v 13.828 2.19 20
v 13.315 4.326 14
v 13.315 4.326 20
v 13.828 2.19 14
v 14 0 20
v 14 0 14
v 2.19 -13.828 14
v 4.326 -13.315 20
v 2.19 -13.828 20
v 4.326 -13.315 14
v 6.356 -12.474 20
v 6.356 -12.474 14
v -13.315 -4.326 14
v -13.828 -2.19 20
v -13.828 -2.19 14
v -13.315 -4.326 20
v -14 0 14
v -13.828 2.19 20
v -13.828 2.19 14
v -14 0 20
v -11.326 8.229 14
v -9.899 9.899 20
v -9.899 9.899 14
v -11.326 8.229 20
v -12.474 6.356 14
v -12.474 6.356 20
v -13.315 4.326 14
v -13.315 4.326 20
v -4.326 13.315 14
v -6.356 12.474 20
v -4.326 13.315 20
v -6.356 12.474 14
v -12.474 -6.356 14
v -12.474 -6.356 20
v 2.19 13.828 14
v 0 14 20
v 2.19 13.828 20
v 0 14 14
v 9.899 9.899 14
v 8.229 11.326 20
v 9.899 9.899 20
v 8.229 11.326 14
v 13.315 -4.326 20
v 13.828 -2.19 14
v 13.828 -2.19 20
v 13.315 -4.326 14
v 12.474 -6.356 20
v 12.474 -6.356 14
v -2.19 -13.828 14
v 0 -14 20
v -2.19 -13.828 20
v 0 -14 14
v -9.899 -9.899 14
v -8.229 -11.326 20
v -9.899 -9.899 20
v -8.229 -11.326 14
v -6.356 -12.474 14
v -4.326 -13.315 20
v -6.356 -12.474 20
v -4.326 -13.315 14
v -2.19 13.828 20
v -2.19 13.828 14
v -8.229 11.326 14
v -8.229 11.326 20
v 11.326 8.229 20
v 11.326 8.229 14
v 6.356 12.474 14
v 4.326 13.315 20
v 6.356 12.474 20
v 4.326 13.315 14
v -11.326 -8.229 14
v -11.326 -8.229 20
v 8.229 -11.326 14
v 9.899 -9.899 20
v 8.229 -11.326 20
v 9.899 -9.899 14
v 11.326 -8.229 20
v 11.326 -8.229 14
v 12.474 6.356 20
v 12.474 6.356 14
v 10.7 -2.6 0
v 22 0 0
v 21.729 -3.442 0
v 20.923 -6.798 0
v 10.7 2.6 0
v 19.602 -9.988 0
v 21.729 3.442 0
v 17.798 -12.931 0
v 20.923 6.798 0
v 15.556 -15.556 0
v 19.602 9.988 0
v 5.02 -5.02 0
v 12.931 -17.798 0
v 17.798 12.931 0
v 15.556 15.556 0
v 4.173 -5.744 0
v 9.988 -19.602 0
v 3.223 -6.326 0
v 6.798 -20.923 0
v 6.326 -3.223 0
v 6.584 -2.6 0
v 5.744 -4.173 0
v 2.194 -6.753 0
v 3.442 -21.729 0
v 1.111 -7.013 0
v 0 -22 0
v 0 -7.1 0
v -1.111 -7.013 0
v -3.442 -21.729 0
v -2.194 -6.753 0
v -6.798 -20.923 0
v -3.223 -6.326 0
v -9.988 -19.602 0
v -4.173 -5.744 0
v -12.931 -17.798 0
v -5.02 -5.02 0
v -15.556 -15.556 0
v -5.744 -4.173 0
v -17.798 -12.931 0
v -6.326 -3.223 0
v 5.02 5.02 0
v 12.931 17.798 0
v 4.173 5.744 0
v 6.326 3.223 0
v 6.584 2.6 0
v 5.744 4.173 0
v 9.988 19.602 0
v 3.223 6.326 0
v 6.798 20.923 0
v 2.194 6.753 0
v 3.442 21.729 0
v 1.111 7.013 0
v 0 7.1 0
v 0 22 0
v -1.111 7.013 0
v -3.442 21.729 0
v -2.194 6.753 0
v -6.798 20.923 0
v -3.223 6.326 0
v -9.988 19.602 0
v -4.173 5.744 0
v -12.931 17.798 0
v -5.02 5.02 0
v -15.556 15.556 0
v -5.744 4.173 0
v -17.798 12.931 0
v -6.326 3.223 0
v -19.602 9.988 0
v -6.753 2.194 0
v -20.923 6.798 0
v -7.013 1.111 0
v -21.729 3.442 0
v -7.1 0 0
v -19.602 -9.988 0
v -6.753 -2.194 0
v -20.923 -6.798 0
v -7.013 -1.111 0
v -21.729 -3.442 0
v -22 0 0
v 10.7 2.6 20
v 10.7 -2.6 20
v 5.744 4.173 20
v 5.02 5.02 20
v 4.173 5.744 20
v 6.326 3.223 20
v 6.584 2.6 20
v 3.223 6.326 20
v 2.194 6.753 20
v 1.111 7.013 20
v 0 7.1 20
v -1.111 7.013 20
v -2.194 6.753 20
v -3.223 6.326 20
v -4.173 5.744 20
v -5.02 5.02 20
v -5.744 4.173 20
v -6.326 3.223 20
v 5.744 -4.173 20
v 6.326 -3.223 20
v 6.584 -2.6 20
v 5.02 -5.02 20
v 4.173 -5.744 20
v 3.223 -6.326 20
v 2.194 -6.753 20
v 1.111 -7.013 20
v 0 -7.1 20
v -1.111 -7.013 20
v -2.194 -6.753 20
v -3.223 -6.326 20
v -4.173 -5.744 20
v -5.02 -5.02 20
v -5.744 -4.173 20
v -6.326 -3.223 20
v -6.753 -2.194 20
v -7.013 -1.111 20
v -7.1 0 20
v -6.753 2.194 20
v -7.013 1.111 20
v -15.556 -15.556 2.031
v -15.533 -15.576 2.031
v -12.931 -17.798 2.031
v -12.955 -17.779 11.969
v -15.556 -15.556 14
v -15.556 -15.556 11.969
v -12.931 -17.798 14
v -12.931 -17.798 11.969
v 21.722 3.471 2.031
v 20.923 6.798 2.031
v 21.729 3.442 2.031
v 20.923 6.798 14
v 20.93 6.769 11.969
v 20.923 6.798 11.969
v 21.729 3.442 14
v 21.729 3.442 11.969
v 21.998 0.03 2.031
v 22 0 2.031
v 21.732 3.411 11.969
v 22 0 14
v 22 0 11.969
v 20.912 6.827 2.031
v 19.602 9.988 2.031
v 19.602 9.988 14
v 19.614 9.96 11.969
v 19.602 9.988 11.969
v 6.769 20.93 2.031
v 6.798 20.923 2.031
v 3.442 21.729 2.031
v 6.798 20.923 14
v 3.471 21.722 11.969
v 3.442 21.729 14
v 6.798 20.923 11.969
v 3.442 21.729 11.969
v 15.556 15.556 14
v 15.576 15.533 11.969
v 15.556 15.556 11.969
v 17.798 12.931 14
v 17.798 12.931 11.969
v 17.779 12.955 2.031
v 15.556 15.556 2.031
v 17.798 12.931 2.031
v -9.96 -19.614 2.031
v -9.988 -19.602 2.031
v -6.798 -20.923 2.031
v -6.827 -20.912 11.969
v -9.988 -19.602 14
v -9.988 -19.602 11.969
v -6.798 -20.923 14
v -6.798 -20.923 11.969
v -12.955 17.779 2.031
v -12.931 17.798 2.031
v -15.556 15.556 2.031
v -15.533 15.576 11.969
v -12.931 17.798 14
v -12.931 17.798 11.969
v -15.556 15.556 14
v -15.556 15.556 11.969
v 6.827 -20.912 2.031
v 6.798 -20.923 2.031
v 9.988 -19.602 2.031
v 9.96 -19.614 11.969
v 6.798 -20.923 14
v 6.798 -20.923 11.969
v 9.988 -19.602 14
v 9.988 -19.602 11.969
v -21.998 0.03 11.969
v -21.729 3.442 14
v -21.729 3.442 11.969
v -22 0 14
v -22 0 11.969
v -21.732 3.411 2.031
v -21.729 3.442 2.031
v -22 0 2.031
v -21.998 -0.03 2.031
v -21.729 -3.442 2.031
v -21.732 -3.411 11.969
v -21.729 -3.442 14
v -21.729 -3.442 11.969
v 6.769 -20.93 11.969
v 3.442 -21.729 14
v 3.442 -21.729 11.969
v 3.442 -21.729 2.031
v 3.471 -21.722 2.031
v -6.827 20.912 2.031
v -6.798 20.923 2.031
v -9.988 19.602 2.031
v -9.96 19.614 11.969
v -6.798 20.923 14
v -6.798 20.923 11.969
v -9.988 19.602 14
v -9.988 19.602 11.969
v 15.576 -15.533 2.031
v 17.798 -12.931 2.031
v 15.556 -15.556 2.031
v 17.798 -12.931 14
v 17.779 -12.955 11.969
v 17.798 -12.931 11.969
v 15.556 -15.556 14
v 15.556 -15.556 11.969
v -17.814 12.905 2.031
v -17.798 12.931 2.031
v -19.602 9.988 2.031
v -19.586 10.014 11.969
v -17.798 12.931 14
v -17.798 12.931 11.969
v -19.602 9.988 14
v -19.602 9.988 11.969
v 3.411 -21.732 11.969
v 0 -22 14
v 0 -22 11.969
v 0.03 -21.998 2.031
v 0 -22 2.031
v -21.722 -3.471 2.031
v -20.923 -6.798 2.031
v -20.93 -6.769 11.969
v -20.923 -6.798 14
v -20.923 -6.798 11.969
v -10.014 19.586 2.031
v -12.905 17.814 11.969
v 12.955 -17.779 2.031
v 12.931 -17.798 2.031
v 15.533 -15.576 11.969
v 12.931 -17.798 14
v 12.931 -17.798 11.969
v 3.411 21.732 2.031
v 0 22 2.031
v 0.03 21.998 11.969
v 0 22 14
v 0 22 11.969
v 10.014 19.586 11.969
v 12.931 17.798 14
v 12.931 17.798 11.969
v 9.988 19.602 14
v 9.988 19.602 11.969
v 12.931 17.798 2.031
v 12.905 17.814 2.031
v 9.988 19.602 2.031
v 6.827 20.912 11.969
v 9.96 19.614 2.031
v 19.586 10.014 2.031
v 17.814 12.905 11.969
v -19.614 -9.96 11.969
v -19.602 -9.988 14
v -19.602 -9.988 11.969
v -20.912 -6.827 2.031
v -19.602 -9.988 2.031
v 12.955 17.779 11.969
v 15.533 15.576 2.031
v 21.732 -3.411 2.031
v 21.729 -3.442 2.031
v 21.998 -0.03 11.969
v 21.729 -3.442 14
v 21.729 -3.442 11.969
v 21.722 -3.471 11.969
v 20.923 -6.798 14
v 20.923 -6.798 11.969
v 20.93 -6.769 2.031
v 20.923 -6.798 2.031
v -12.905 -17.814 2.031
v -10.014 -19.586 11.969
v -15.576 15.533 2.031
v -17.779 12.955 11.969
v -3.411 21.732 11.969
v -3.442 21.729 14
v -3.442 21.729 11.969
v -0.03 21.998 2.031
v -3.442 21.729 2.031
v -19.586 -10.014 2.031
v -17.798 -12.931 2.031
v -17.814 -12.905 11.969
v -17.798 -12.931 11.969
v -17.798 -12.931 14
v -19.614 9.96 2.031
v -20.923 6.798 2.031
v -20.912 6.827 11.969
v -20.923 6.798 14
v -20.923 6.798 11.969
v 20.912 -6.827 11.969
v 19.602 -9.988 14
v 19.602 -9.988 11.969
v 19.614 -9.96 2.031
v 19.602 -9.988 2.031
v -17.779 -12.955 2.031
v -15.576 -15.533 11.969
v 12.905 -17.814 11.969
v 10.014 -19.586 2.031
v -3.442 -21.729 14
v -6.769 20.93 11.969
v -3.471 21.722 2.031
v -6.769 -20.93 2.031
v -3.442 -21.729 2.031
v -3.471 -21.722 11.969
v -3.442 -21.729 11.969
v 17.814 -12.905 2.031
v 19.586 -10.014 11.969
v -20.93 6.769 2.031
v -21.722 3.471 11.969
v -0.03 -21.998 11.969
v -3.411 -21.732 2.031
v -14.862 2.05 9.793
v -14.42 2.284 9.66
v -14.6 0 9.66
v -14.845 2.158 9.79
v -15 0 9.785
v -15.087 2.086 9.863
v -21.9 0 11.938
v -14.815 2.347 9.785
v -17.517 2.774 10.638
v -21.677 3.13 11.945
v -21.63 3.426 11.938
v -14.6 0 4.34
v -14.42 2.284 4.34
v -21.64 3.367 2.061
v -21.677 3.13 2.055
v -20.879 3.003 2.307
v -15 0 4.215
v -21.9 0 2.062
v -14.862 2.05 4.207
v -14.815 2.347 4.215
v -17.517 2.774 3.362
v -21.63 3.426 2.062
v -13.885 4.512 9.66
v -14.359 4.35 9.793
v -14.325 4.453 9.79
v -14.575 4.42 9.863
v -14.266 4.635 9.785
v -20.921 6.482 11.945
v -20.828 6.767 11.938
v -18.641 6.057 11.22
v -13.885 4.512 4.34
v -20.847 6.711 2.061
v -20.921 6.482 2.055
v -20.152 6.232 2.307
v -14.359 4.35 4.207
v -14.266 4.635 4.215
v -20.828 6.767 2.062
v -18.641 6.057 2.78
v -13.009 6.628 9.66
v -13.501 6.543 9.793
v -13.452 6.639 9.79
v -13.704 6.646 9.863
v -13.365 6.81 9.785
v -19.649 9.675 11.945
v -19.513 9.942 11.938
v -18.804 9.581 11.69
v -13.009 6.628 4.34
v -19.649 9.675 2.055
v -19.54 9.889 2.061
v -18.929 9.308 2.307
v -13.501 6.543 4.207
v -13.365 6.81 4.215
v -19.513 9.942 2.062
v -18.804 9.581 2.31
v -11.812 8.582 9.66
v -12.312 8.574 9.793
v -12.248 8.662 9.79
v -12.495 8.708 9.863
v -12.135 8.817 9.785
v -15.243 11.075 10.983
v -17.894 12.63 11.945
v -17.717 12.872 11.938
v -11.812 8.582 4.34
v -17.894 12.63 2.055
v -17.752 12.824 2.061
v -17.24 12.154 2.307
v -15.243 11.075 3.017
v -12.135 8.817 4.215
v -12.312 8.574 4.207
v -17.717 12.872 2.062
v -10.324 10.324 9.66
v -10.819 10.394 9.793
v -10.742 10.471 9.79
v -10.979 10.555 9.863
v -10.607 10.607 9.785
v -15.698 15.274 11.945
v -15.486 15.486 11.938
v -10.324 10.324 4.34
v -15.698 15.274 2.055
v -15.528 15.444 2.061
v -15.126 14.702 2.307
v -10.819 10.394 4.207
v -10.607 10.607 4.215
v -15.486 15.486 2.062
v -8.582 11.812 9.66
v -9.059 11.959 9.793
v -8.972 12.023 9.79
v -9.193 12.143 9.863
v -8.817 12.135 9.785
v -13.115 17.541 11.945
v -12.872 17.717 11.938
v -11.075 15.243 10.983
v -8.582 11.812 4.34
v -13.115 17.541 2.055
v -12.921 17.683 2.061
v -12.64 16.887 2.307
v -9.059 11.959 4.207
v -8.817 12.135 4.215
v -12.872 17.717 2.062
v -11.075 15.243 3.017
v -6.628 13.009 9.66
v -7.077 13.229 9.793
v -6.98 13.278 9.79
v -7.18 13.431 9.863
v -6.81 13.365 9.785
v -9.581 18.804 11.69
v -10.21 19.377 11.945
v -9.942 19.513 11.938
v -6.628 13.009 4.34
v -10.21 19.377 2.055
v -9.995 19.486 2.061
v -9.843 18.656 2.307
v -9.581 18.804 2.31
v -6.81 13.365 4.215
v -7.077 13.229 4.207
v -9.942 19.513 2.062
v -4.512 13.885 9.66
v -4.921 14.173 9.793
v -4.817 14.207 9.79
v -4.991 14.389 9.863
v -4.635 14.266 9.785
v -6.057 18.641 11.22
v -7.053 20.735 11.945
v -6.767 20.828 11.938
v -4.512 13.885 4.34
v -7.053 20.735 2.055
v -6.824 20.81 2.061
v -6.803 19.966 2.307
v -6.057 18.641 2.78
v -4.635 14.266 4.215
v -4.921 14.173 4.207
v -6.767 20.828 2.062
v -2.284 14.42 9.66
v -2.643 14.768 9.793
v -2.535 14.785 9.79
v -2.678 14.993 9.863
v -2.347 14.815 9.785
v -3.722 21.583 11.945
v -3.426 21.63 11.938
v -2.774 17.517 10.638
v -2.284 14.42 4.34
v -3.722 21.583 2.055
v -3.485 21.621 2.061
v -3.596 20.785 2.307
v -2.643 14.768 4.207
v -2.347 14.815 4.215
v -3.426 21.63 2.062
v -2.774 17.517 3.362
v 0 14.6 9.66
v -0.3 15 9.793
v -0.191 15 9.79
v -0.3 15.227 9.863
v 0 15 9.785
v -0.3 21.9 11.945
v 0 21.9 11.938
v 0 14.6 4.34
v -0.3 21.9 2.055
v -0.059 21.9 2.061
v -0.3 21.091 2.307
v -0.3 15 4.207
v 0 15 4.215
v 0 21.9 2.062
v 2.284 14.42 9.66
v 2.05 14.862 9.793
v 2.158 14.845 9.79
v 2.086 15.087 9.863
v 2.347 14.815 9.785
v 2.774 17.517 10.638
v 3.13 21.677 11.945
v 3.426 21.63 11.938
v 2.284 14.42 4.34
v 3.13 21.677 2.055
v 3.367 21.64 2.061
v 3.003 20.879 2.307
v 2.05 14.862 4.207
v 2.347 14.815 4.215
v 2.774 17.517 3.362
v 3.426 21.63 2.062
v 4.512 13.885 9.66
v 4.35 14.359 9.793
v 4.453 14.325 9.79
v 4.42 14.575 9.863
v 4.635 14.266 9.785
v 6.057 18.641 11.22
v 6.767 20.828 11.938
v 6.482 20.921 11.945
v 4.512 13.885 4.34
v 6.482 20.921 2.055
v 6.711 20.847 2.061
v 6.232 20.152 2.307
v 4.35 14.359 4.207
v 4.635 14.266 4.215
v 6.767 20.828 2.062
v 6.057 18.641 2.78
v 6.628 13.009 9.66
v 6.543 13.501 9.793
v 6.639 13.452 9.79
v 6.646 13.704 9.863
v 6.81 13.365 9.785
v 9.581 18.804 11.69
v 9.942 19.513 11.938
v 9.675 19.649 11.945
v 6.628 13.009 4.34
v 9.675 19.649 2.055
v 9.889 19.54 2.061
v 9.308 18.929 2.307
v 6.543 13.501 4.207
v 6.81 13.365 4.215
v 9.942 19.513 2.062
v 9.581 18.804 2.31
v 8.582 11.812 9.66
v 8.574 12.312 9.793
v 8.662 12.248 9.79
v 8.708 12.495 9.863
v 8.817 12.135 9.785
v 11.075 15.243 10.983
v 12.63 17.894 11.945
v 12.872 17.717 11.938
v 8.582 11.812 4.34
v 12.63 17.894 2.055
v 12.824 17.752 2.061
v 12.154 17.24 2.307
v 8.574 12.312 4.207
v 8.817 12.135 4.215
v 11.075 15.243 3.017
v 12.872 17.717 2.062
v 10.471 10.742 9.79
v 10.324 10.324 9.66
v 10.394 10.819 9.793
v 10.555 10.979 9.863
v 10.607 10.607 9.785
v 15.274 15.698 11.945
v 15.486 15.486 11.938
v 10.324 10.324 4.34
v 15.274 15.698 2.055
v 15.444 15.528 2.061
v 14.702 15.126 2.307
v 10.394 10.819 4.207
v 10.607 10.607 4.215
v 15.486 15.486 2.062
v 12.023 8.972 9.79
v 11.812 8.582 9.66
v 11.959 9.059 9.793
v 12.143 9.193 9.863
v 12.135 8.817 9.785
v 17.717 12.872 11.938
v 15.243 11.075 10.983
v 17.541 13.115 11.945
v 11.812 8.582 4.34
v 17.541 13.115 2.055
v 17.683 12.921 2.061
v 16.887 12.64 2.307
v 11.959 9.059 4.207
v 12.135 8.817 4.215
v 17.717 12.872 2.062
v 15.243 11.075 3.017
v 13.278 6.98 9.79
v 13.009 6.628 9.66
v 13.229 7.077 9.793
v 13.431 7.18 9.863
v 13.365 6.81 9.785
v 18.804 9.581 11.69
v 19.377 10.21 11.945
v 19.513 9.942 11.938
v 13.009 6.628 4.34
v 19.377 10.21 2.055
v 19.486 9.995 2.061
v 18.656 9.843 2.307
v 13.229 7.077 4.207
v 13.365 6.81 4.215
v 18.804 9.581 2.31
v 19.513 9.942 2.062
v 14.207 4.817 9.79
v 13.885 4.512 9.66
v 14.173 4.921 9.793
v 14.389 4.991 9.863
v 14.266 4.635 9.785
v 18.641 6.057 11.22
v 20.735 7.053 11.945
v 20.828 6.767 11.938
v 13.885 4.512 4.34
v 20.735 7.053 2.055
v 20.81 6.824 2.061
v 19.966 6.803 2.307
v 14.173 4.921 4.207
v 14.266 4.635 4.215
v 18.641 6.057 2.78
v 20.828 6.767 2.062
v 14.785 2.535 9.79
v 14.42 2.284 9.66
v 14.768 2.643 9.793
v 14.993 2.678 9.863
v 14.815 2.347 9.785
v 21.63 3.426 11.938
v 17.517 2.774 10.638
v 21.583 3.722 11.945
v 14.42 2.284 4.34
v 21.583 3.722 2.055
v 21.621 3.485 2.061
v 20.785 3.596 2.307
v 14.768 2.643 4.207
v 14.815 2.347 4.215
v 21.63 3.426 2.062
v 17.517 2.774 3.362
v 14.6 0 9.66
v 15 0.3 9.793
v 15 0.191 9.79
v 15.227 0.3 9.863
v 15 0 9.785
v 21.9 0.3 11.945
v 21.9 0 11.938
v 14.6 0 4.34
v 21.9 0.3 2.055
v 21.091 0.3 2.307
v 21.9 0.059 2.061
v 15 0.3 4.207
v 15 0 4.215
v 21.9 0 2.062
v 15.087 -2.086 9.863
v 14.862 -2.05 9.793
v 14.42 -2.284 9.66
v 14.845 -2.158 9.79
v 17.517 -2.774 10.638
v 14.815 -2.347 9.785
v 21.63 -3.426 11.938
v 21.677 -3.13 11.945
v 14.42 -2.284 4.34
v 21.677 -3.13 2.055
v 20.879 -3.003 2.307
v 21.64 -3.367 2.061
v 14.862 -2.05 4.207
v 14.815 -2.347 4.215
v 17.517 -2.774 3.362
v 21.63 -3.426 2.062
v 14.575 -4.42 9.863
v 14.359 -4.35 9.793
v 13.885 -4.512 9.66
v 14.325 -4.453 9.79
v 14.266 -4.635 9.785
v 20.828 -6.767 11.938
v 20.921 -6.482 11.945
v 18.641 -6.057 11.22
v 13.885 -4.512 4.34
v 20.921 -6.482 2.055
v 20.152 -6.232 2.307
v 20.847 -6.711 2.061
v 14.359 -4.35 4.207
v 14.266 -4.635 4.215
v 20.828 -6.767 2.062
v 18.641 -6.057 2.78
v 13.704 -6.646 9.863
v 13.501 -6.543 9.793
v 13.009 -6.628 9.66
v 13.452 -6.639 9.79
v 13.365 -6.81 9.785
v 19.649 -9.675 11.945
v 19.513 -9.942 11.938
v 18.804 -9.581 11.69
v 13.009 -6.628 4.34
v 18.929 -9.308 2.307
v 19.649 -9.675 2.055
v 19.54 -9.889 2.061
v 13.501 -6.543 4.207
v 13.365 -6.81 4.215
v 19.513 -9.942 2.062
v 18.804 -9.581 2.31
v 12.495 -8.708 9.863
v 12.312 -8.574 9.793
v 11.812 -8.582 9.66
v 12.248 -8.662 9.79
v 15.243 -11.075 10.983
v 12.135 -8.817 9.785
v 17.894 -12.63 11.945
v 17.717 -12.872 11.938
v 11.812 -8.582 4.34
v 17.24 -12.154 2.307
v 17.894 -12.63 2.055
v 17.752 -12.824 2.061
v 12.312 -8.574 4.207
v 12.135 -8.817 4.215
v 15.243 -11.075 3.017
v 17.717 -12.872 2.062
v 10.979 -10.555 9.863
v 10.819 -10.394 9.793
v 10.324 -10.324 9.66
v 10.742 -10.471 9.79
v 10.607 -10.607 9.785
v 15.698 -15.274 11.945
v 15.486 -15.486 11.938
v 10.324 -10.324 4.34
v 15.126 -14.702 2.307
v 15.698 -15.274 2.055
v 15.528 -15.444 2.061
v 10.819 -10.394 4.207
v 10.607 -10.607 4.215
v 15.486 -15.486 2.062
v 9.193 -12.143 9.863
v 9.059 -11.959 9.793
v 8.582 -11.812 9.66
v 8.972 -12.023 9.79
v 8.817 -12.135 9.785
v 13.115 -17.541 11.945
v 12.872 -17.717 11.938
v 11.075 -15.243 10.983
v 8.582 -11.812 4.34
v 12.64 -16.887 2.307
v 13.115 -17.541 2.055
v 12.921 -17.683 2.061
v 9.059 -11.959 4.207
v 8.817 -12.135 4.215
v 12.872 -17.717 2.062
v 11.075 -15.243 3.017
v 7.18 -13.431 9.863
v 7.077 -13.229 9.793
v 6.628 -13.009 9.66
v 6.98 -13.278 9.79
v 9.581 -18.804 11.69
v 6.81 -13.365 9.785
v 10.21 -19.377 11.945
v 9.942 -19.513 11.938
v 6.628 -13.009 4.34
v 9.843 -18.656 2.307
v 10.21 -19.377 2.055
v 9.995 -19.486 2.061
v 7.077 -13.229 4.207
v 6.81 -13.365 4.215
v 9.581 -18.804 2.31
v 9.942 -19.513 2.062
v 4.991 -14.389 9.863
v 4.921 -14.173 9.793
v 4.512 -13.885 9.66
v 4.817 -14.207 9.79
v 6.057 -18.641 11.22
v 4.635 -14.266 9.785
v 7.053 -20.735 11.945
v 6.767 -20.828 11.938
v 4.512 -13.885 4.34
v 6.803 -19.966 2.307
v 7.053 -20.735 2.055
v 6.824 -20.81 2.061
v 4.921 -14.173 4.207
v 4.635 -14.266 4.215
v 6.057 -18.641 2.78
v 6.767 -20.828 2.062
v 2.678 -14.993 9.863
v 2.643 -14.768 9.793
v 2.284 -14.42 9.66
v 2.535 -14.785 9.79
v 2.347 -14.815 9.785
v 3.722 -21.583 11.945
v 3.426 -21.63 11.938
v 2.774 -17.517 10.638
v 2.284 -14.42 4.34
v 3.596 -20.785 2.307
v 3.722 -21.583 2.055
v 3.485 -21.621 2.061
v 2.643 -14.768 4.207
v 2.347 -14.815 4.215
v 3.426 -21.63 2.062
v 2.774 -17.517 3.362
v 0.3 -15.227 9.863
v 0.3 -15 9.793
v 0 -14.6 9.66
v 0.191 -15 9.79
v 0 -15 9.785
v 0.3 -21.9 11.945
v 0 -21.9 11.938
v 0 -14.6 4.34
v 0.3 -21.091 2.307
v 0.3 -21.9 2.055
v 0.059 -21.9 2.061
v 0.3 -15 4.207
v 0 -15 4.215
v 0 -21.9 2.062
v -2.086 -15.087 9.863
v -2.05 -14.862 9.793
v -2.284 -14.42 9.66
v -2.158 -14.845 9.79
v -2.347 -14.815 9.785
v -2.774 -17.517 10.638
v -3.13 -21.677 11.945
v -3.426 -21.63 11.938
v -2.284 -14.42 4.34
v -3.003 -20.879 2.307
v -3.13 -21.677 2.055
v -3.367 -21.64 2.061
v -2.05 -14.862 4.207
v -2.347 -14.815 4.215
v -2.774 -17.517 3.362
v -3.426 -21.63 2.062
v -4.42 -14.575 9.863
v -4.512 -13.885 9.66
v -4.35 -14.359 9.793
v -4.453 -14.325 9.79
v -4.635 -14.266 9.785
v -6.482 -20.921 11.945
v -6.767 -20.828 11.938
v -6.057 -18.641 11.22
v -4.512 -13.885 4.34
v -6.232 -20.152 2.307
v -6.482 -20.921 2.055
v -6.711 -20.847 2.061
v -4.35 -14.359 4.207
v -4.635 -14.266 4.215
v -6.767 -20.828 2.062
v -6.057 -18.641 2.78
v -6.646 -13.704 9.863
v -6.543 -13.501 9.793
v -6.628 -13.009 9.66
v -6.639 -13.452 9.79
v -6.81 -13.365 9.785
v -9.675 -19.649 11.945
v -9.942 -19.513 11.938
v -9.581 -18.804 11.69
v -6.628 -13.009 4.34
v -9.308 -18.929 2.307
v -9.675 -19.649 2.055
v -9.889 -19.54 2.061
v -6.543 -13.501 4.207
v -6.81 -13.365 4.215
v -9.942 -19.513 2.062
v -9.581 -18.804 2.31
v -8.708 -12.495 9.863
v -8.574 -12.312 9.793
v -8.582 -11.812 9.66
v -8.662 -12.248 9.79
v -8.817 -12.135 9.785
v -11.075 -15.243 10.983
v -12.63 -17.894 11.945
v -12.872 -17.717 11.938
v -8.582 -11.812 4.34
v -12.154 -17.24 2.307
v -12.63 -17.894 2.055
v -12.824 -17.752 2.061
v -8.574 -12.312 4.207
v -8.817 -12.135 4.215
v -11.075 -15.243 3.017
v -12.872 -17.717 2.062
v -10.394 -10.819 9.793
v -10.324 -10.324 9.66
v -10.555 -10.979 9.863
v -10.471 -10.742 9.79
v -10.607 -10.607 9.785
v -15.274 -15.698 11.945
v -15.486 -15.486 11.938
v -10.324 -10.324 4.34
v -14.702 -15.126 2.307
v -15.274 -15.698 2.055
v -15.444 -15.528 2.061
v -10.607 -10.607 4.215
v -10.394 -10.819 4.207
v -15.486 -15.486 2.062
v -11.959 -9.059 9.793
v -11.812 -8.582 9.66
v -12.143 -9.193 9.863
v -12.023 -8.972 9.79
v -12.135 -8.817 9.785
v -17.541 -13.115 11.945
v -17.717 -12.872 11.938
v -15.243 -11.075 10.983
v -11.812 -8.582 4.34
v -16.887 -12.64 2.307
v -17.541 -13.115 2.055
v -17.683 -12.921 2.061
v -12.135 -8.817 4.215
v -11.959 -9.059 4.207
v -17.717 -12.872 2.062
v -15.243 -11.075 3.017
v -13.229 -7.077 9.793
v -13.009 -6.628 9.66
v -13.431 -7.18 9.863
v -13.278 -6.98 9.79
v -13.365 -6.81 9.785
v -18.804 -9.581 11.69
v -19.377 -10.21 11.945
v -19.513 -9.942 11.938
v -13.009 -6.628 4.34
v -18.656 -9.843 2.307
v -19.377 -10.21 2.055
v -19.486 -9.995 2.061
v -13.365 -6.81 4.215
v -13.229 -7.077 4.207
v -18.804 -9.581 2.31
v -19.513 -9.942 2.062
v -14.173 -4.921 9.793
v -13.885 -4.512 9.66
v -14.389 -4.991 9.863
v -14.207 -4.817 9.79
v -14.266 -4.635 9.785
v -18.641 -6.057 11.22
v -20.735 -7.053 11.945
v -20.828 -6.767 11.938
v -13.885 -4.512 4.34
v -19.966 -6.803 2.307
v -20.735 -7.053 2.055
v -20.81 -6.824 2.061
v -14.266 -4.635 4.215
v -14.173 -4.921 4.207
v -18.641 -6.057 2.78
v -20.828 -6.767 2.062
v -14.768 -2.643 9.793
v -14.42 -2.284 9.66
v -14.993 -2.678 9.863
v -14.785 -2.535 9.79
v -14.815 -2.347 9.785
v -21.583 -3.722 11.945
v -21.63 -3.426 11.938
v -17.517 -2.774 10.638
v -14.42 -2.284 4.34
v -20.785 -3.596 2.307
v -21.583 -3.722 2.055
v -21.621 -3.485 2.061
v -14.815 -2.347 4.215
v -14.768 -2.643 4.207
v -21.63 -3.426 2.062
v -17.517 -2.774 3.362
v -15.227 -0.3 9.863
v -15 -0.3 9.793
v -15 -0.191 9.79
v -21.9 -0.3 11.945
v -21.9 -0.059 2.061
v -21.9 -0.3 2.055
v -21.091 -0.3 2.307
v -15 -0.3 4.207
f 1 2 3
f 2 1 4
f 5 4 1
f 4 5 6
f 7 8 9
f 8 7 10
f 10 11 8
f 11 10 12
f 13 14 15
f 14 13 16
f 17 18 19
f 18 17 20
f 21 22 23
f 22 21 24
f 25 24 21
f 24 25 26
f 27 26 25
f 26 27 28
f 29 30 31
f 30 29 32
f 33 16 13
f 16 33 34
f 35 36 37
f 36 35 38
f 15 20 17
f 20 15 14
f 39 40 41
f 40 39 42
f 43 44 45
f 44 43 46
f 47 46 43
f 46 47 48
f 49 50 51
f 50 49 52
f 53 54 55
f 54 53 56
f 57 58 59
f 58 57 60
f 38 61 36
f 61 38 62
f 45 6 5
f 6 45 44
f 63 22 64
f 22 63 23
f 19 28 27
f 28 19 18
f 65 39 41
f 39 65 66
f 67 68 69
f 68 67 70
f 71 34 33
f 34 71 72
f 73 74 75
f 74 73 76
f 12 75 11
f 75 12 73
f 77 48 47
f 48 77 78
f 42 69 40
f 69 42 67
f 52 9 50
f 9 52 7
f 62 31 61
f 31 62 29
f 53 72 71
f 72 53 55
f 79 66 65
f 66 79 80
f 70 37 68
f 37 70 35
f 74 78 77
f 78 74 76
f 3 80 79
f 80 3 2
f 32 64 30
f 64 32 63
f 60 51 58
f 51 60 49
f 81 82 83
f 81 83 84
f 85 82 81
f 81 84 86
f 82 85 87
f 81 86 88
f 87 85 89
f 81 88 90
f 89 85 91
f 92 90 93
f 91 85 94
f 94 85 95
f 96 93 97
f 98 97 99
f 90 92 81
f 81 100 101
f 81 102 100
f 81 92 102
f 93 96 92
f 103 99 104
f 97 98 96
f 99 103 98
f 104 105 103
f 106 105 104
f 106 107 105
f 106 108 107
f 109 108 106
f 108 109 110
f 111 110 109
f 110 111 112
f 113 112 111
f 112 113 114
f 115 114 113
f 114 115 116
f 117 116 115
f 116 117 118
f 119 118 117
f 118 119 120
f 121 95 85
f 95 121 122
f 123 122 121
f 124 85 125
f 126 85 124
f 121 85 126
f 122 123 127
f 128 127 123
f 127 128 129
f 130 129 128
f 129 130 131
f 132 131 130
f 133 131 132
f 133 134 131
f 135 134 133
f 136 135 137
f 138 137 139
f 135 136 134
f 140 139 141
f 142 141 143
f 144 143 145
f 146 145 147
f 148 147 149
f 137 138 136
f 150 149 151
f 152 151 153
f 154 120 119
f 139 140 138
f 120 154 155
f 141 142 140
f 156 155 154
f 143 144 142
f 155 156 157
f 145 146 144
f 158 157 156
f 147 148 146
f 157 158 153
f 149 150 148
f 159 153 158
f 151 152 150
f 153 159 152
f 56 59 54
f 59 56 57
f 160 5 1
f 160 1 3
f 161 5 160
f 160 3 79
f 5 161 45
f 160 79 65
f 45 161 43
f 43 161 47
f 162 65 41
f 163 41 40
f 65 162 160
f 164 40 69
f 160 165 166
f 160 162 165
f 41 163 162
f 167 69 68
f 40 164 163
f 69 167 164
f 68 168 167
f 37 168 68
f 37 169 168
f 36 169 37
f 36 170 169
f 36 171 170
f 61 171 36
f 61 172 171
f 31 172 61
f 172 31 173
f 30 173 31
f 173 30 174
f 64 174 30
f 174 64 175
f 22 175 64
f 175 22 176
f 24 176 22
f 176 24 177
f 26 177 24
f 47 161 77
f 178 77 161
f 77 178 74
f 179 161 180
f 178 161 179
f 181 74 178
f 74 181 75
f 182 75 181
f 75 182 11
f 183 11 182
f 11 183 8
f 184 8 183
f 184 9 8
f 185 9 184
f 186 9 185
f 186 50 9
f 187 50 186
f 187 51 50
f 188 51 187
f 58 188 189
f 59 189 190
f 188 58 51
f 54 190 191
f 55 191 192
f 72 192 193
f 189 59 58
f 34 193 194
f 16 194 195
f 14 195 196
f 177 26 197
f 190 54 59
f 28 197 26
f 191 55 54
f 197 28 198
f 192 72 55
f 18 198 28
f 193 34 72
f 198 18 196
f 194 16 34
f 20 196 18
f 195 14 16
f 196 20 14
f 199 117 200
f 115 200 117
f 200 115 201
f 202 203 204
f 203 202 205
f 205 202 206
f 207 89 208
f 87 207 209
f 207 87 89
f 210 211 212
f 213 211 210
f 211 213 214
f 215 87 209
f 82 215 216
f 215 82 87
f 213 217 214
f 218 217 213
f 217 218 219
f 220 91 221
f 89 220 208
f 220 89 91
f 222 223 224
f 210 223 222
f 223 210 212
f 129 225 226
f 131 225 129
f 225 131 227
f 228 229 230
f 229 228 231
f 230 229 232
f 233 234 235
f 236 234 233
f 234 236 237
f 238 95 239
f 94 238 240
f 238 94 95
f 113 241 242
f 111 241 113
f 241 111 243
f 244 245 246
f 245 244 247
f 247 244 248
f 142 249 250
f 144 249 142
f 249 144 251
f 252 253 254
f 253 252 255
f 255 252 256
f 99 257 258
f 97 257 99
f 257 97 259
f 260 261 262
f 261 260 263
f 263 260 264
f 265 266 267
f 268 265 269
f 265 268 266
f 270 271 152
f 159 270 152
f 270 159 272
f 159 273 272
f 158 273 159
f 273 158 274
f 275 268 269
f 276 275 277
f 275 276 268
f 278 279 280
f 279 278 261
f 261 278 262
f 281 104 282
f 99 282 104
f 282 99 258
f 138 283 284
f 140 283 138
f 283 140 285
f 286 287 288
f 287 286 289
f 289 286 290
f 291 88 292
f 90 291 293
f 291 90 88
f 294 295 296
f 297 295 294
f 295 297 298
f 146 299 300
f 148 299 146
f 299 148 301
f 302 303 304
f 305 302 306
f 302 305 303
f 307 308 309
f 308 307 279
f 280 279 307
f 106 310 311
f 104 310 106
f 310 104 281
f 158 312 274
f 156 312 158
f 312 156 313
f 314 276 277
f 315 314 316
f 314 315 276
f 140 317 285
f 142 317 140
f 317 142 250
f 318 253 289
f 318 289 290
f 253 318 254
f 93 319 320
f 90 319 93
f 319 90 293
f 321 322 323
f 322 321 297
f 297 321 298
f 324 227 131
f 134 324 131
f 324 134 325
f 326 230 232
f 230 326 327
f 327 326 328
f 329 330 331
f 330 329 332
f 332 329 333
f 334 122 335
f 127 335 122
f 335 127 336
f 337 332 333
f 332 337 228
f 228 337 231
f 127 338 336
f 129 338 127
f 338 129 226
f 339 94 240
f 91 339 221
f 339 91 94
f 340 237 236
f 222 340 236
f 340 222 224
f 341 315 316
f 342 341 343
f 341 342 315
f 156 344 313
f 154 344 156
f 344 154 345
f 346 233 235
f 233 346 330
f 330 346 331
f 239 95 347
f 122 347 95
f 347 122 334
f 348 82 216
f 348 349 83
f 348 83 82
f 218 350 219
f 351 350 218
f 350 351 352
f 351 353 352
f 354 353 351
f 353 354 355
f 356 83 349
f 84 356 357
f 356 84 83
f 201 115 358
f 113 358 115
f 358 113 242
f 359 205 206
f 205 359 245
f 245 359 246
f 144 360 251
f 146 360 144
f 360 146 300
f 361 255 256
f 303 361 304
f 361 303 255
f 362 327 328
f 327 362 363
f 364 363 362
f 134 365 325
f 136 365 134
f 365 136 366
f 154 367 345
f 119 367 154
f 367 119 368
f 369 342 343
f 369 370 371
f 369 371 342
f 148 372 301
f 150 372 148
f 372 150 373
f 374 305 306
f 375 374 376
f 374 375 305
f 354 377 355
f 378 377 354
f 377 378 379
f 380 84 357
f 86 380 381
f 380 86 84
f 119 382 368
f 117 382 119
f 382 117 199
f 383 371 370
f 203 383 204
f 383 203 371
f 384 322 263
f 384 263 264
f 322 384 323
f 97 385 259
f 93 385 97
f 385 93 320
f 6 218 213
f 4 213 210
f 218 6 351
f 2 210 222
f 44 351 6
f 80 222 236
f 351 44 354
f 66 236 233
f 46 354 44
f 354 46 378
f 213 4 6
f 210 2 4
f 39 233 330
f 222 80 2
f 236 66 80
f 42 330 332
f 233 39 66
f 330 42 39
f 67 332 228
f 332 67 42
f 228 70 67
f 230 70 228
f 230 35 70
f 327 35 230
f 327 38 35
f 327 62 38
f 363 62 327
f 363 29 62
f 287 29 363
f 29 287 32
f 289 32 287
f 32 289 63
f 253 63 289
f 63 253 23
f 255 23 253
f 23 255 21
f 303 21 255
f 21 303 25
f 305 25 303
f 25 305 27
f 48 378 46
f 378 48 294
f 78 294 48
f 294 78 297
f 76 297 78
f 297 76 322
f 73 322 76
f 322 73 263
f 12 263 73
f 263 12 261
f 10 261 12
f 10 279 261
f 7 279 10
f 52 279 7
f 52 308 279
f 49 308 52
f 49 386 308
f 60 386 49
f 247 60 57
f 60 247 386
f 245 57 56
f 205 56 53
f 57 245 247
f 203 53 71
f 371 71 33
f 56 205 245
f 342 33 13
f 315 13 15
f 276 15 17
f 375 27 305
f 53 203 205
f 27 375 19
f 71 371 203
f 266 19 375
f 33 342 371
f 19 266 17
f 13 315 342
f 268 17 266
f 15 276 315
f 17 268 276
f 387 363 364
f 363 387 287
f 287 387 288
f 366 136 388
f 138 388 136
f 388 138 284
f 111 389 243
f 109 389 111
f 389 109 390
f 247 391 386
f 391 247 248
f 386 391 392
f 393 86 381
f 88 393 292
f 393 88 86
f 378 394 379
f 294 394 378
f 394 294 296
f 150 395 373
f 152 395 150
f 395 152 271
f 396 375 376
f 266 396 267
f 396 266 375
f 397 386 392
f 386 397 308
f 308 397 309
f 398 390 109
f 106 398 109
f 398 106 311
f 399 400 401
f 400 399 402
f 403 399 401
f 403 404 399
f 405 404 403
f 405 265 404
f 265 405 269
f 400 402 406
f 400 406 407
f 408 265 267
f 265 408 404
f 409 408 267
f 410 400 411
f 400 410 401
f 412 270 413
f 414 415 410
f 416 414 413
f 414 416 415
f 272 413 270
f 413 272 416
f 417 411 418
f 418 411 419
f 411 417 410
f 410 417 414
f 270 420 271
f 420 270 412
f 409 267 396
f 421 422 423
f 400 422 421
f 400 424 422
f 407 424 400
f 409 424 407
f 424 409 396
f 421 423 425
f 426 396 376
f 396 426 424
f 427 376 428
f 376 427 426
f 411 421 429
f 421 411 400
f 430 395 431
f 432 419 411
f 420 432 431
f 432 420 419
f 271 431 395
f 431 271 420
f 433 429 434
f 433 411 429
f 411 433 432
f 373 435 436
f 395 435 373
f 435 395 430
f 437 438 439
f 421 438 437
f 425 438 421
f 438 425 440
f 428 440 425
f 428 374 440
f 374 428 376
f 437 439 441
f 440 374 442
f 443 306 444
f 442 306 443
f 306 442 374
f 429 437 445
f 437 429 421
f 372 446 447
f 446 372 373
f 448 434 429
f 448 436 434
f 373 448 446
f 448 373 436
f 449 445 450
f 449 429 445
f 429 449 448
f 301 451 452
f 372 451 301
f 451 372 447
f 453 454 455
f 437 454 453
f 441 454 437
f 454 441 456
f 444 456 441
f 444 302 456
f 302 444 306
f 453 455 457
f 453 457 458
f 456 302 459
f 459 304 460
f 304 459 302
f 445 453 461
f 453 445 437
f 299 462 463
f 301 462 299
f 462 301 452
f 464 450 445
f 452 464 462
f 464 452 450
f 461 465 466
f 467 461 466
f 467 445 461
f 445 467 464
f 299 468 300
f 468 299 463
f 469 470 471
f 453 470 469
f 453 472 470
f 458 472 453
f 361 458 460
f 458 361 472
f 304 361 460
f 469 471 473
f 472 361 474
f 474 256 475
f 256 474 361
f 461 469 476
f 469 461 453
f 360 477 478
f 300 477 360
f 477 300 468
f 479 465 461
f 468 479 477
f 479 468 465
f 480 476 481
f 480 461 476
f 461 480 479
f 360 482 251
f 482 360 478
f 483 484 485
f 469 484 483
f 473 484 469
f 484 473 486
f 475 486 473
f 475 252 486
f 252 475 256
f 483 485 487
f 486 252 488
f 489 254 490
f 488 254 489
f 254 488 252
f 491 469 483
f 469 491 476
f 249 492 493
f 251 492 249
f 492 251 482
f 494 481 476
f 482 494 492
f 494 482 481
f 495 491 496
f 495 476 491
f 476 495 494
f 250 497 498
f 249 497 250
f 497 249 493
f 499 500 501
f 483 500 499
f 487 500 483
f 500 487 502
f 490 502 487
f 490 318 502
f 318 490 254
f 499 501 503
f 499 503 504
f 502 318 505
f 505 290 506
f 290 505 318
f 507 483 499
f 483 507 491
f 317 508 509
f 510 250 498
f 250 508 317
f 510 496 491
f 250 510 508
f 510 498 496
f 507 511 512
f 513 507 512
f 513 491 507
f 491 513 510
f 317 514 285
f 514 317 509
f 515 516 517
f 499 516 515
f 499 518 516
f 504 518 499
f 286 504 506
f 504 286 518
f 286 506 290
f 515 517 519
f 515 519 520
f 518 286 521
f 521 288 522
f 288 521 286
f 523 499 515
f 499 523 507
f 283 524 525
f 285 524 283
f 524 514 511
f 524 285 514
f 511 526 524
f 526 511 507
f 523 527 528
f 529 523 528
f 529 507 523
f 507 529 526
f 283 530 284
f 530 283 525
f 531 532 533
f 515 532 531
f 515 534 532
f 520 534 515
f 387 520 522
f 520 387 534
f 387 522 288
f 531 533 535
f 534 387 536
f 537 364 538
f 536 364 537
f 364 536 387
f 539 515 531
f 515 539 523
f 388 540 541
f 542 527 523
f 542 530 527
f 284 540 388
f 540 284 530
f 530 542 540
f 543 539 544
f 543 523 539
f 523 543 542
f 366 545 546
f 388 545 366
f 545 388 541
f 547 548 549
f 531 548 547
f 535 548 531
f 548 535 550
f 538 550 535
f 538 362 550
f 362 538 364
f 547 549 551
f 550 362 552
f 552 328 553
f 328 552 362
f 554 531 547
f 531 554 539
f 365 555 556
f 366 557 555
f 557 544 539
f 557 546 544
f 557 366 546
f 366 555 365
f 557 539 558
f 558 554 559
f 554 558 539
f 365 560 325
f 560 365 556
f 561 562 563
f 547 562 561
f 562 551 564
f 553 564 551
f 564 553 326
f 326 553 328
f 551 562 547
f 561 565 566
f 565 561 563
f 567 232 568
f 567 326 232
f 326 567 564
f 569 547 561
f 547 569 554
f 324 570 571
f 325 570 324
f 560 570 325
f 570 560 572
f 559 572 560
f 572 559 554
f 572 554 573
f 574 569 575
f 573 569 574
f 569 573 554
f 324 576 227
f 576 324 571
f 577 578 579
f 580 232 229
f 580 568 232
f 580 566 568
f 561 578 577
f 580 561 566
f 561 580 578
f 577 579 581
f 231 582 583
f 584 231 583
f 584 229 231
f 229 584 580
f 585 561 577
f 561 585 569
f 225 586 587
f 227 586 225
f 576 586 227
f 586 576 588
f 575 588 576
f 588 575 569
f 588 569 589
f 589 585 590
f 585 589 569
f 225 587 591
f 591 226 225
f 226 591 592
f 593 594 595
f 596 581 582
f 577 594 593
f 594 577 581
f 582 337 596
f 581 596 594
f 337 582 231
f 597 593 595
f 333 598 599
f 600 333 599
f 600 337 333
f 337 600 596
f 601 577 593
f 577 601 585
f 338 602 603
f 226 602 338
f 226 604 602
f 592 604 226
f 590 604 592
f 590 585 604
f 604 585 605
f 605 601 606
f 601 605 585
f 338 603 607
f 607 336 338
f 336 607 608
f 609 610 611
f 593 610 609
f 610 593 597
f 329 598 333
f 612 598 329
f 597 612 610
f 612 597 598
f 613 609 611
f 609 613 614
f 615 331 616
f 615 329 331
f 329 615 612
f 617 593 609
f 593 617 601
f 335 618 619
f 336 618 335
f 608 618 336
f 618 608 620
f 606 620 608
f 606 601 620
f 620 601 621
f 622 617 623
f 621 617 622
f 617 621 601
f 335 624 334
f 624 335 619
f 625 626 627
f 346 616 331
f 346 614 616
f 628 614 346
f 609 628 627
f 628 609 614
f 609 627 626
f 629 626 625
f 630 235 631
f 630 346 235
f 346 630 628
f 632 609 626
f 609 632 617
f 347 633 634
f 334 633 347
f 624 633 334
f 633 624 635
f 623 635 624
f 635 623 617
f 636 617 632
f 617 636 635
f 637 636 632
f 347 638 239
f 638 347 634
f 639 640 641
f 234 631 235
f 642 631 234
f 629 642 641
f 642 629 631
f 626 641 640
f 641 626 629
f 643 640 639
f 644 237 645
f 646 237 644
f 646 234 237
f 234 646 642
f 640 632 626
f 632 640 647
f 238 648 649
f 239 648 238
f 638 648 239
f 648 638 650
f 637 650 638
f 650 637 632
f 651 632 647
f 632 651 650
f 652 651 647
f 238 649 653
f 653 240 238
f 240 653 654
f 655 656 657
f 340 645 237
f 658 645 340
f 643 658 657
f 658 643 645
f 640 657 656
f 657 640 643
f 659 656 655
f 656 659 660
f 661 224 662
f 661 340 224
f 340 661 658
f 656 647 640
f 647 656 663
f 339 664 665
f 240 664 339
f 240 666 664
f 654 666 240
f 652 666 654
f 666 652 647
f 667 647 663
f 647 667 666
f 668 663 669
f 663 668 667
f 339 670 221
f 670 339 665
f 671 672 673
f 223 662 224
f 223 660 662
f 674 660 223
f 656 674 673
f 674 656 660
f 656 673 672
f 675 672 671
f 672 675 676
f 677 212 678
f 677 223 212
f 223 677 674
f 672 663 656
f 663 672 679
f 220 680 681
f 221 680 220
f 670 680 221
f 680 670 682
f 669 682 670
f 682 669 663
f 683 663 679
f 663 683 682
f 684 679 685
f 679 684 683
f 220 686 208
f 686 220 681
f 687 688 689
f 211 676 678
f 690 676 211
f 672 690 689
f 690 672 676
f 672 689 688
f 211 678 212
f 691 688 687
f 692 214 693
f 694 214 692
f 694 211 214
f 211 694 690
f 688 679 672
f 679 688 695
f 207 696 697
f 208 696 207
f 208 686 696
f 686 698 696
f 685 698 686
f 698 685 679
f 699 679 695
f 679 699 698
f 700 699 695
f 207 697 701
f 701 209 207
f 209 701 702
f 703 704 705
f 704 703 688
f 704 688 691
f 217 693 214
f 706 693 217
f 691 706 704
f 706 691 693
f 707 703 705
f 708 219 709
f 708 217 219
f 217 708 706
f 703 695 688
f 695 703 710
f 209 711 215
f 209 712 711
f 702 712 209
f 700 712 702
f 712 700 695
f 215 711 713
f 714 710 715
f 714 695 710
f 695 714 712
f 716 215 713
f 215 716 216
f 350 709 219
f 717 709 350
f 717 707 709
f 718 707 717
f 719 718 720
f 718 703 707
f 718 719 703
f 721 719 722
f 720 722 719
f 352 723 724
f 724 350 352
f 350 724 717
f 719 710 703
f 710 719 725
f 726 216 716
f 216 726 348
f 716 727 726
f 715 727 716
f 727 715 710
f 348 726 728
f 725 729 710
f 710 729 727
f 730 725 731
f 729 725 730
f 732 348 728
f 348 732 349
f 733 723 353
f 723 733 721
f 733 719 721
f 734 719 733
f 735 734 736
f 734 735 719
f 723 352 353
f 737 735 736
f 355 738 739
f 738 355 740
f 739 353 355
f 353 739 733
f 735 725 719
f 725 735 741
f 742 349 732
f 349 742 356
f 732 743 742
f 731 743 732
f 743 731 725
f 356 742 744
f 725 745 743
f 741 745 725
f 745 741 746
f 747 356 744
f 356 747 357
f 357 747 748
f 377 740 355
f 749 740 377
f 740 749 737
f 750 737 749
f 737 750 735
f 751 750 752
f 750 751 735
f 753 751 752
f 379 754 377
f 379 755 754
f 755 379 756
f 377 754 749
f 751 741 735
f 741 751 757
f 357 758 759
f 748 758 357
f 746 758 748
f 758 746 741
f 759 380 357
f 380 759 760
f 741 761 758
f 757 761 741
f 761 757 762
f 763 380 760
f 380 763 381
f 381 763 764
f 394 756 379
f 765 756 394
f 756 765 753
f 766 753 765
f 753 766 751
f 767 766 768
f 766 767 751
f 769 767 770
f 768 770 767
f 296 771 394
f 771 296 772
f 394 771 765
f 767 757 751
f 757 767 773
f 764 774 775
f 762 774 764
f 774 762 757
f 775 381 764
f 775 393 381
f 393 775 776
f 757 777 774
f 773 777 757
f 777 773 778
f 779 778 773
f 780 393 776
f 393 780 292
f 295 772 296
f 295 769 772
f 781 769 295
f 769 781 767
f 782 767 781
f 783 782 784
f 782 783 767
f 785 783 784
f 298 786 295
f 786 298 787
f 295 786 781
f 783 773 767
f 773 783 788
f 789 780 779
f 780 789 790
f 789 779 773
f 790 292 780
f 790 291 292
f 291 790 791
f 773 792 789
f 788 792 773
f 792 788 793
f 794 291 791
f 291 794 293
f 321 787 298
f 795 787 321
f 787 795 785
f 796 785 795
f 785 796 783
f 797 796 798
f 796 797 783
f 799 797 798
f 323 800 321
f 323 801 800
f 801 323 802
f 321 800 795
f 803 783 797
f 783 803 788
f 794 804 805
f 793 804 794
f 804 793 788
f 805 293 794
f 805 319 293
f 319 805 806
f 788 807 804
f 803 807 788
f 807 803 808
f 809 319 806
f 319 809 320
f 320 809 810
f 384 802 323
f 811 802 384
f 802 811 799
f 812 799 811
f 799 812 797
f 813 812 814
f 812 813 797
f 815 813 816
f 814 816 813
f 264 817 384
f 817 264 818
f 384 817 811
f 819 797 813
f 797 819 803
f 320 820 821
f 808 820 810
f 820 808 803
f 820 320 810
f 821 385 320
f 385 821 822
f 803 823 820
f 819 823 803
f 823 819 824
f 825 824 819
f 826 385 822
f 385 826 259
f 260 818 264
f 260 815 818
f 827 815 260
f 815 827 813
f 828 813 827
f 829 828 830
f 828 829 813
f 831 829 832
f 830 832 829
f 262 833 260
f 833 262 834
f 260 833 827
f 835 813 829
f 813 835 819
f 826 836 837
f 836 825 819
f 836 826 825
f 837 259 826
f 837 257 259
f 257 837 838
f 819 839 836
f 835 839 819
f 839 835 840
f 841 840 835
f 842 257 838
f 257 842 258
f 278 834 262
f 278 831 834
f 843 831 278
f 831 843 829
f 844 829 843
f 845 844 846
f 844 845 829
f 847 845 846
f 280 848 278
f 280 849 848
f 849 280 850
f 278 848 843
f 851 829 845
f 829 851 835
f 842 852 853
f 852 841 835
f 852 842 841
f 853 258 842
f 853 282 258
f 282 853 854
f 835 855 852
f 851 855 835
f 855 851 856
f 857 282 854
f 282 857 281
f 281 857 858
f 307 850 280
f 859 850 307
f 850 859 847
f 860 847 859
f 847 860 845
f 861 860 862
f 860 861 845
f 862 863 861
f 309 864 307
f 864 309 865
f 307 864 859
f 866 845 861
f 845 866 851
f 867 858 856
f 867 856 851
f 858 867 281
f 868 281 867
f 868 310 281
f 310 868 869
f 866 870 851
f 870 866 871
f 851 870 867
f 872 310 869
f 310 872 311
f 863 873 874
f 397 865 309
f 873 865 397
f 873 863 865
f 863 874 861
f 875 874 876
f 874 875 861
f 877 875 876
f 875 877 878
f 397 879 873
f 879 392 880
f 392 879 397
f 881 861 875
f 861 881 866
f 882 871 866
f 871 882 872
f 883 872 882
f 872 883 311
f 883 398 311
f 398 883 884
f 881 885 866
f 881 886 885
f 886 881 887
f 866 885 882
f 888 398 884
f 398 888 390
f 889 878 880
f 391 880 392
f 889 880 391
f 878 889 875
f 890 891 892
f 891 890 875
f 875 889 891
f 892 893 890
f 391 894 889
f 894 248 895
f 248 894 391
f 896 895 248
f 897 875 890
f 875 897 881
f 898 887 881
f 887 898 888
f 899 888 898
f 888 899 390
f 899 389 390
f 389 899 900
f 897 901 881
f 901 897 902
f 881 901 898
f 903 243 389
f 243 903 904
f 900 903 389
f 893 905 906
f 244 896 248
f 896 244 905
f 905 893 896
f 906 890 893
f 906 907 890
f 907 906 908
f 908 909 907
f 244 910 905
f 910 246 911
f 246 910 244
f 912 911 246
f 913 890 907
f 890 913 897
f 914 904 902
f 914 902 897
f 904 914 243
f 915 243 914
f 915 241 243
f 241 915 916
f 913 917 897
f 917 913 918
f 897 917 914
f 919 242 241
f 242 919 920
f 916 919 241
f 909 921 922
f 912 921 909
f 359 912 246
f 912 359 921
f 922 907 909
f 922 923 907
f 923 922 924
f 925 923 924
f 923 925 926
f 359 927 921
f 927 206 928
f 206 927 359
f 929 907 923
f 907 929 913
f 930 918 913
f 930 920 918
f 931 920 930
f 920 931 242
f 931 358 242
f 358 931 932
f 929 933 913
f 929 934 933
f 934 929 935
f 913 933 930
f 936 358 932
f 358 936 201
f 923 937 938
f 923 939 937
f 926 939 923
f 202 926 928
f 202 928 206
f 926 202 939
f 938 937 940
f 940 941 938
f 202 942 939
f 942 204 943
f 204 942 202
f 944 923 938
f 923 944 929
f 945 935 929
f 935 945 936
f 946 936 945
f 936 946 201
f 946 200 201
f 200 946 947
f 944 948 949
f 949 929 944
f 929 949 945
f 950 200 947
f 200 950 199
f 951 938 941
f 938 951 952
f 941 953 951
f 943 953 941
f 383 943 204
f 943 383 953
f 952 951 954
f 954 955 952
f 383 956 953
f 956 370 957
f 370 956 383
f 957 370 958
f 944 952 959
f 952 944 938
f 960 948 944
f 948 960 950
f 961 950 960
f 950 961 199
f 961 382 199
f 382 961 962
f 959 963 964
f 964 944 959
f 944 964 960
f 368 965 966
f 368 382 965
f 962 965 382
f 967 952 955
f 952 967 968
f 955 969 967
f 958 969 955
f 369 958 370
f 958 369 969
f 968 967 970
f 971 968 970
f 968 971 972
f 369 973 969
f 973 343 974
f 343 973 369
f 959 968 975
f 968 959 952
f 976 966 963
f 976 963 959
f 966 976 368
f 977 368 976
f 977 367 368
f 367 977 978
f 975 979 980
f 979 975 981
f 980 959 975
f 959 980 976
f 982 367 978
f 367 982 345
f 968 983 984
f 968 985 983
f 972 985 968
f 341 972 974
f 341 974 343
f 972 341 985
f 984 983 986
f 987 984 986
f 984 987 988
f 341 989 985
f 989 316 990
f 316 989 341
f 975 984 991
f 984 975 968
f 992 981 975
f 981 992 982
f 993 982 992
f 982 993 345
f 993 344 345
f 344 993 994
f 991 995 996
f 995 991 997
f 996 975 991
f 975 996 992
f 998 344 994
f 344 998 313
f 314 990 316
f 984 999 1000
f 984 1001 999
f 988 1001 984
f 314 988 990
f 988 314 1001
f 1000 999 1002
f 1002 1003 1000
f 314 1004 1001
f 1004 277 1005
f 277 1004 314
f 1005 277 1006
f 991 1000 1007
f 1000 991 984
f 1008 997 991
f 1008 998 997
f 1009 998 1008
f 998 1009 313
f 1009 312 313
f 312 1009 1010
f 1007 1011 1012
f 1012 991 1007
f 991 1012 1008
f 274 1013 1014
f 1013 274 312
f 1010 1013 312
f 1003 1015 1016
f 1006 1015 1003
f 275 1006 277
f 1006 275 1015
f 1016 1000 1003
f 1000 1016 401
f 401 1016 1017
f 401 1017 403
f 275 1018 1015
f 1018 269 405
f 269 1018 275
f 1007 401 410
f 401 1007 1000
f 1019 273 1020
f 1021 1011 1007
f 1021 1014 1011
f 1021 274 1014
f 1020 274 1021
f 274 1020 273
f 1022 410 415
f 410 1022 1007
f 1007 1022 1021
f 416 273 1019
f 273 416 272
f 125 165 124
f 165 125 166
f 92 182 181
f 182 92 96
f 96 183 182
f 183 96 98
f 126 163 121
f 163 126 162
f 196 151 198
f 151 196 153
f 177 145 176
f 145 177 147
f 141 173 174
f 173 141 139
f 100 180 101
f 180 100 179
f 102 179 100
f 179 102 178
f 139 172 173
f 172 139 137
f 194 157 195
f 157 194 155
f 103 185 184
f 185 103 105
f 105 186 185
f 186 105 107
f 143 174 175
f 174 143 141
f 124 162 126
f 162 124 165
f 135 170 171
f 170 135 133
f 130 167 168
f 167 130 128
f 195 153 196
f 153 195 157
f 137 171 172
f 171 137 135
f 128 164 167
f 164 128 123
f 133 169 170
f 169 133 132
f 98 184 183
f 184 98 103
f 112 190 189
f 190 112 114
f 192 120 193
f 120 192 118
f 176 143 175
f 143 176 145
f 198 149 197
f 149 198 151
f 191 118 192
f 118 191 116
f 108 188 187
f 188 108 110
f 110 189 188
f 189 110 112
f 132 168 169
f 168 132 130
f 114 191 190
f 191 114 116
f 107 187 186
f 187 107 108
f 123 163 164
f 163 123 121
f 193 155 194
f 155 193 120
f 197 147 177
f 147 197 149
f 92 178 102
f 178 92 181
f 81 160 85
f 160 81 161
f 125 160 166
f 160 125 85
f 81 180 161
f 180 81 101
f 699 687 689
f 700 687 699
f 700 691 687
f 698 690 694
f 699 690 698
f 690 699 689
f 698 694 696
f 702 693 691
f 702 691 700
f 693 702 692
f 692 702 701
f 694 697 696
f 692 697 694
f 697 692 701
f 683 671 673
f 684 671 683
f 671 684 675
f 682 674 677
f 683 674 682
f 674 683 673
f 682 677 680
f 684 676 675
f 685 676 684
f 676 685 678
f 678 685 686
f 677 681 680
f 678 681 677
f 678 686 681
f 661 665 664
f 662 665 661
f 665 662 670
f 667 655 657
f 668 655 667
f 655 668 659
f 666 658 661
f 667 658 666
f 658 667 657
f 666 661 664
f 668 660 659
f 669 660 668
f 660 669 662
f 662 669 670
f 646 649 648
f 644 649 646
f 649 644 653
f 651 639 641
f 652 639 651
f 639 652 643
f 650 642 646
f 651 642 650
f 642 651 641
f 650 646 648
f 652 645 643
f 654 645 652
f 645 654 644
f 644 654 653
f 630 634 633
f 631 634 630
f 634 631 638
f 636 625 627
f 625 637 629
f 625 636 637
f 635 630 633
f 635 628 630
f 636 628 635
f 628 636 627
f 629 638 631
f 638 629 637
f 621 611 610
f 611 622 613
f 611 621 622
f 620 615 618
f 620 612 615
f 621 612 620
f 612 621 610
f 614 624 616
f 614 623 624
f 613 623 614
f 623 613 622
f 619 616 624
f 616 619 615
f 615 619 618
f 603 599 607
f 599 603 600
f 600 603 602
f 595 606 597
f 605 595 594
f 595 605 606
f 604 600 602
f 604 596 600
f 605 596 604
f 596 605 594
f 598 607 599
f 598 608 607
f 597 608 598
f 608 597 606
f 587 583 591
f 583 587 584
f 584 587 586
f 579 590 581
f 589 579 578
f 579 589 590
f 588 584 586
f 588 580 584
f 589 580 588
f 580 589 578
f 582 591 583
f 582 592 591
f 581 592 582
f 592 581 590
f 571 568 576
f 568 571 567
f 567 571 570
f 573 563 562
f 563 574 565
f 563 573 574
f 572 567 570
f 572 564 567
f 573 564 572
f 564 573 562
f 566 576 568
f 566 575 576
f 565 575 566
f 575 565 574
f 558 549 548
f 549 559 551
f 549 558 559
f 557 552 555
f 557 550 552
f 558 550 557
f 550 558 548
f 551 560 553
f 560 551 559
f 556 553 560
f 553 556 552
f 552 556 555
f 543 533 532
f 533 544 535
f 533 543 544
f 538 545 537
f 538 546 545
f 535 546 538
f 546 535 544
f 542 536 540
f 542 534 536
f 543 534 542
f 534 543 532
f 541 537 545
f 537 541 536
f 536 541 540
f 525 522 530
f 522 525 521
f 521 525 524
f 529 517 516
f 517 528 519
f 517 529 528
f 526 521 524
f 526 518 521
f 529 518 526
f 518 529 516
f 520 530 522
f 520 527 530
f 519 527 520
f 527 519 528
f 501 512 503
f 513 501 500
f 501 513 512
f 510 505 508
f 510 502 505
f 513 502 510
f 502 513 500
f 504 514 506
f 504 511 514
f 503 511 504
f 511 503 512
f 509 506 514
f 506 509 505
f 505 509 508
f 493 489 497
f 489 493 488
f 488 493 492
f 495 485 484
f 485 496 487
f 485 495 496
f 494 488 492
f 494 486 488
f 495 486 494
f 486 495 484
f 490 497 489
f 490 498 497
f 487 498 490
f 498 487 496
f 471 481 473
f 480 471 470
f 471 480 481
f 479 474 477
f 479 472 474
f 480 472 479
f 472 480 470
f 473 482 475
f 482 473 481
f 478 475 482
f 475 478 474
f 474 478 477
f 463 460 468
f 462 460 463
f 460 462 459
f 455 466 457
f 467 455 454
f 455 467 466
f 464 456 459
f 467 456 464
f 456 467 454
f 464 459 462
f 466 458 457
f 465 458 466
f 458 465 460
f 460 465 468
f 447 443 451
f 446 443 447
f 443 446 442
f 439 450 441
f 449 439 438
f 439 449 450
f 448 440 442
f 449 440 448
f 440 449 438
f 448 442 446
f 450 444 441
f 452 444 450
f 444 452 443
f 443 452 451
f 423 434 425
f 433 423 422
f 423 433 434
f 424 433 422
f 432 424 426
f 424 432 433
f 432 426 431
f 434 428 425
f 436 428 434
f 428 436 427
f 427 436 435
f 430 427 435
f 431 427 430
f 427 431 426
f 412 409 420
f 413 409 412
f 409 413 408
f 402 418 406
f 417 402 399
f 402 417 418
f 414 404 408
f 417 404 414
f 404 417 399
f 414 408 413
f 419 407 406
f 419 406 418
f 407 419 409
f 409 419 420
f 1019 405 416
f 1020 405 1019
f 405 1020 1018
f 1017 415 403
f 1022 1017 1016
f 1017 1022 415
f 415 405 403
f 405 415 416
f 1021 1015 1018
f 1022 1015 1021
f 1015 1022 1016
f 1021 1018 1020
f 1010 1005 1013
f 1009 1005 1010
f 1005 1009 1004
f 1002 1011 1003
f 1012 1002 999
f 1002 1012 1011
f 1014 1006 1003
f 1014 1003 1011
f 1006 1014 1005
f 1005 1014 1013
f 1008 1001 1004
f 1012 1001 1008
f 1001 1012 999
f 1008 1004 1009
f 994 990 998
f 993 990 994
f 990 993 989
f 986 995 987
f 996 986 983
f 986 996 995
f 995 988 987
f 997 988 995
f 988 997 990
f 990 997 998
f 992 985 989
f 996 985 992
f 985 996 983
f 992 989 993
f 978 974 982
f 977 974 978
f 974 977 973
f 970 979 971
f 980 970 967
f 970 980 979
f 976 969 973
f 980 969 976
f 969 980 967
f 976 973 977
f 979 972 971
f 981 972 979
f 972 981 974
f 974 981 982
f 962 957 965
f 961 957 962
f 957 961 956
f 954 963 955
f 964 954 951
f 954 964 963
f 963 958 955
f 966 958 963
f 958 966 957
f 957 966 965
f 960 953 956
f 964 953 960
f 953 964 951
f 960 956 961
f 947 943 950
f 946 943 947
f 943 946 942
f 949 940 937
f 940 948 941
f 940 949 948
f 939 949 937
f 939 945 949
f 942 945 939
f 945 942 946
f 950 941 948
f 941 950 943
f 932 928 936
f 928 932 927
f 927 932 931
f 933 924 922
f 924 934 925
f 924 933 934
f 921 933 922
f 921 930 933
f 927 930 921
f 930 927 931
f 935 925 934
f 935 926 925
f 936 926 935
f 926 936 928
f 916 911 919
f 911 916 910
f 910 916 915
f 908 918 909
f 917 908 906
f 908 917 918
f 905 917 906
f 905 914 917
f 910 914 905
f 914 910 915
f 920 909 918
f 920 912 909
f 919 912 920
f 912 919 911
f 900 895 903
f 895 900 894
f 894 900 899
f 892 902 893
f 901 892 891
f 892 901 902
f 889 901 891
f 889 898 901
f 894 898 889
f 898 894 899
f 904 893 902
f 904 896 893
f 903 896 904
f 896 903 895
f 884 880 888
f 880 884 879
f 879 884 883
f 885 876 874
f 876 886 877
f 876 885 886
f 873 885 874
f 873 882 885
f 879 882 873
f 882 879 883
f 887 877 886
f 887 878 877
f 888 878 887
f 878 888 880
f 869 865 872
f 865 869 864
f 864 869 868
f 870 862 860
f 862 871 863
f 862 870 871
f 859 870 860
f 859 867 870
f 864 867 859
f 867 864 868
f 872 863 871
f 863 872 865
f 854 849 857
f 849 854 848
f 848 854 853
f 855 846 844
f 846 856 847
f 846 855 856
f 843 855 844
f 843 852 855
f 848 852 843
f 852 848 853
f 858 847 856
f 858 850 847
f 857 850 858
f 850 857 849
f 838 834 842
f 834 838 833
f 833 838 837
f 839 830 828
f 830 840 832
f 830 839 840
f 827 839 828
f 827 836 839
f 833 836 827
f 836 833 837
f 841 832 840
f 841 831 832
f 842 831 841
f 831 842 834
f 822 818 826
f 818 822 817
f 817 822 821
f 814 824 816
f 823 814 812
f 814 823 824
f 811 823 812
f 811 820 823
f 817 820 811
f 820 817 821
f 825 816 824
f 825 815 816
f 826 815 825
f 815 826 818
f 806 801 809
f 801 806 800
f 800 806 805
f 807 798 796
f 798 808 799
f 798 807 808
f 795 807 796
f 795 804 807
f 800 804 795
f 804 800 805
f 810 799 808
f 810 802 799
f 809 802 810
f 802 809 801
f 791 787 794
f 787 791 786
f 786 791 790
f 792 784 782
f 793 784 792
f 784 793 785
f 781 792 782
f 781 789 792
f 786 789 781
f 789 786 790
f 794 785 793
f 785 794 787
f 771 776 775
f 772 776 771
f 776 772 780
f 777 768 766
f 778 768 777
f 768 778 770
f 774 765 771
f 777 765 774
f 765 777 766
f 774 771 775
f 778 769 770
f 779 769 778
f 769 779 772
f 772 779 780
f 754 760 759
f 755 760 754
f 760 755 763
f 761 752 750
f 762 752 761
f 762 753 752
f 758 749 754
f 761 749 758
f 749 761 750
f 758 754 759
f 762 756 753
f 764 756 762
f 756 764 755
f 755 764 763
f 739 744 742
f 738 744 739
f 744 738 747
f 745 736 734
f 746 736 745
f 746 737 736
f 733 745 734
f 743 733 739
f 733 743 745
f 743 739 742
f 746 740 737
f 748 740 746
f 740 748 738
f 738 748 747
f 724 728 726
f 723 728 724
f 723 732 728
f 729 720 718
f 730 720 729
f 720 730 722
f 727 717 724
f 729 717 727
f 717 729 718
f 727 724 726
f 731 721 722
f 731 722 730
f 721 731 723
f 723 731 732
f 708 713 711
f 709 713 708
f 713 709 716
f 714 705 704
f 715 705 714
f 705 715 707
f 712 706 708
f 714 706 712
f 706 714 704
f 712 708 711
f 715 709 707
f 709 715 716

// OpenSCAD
$fn = 40;

rr = 30/2;

module profile()
{
    ang = 40;
    polygon(points=[[0,10*cos(ang)], [7.5,10], [7.5,0], [0,10-10*cos(ang)]]);
}


difference()
{
  union()
  {
    cylinder(d=28, h=20);
    cylinder(d=44, h=12+2);
  }

translate([0,0,2])
rotate_extrude(convexity=10)
translate([44/2-7.4,0,0])
//rotate([0,90,0])
//circle(r=5, $fn=4);
  profile();
  
  
  cylinder(d=14.2, h=25);
  
  translate([4.5+1,-2.6,0])
  cube([5.2,5.2,25]);
}

nn = 40;
for(i=[1:nn])
{
  translate([rr*cos(i*360/nn),rr*sin(i*360/nn),0])
    rotate([0,0,i*360/nn])
    cube([6.9,.3,14]);
}
